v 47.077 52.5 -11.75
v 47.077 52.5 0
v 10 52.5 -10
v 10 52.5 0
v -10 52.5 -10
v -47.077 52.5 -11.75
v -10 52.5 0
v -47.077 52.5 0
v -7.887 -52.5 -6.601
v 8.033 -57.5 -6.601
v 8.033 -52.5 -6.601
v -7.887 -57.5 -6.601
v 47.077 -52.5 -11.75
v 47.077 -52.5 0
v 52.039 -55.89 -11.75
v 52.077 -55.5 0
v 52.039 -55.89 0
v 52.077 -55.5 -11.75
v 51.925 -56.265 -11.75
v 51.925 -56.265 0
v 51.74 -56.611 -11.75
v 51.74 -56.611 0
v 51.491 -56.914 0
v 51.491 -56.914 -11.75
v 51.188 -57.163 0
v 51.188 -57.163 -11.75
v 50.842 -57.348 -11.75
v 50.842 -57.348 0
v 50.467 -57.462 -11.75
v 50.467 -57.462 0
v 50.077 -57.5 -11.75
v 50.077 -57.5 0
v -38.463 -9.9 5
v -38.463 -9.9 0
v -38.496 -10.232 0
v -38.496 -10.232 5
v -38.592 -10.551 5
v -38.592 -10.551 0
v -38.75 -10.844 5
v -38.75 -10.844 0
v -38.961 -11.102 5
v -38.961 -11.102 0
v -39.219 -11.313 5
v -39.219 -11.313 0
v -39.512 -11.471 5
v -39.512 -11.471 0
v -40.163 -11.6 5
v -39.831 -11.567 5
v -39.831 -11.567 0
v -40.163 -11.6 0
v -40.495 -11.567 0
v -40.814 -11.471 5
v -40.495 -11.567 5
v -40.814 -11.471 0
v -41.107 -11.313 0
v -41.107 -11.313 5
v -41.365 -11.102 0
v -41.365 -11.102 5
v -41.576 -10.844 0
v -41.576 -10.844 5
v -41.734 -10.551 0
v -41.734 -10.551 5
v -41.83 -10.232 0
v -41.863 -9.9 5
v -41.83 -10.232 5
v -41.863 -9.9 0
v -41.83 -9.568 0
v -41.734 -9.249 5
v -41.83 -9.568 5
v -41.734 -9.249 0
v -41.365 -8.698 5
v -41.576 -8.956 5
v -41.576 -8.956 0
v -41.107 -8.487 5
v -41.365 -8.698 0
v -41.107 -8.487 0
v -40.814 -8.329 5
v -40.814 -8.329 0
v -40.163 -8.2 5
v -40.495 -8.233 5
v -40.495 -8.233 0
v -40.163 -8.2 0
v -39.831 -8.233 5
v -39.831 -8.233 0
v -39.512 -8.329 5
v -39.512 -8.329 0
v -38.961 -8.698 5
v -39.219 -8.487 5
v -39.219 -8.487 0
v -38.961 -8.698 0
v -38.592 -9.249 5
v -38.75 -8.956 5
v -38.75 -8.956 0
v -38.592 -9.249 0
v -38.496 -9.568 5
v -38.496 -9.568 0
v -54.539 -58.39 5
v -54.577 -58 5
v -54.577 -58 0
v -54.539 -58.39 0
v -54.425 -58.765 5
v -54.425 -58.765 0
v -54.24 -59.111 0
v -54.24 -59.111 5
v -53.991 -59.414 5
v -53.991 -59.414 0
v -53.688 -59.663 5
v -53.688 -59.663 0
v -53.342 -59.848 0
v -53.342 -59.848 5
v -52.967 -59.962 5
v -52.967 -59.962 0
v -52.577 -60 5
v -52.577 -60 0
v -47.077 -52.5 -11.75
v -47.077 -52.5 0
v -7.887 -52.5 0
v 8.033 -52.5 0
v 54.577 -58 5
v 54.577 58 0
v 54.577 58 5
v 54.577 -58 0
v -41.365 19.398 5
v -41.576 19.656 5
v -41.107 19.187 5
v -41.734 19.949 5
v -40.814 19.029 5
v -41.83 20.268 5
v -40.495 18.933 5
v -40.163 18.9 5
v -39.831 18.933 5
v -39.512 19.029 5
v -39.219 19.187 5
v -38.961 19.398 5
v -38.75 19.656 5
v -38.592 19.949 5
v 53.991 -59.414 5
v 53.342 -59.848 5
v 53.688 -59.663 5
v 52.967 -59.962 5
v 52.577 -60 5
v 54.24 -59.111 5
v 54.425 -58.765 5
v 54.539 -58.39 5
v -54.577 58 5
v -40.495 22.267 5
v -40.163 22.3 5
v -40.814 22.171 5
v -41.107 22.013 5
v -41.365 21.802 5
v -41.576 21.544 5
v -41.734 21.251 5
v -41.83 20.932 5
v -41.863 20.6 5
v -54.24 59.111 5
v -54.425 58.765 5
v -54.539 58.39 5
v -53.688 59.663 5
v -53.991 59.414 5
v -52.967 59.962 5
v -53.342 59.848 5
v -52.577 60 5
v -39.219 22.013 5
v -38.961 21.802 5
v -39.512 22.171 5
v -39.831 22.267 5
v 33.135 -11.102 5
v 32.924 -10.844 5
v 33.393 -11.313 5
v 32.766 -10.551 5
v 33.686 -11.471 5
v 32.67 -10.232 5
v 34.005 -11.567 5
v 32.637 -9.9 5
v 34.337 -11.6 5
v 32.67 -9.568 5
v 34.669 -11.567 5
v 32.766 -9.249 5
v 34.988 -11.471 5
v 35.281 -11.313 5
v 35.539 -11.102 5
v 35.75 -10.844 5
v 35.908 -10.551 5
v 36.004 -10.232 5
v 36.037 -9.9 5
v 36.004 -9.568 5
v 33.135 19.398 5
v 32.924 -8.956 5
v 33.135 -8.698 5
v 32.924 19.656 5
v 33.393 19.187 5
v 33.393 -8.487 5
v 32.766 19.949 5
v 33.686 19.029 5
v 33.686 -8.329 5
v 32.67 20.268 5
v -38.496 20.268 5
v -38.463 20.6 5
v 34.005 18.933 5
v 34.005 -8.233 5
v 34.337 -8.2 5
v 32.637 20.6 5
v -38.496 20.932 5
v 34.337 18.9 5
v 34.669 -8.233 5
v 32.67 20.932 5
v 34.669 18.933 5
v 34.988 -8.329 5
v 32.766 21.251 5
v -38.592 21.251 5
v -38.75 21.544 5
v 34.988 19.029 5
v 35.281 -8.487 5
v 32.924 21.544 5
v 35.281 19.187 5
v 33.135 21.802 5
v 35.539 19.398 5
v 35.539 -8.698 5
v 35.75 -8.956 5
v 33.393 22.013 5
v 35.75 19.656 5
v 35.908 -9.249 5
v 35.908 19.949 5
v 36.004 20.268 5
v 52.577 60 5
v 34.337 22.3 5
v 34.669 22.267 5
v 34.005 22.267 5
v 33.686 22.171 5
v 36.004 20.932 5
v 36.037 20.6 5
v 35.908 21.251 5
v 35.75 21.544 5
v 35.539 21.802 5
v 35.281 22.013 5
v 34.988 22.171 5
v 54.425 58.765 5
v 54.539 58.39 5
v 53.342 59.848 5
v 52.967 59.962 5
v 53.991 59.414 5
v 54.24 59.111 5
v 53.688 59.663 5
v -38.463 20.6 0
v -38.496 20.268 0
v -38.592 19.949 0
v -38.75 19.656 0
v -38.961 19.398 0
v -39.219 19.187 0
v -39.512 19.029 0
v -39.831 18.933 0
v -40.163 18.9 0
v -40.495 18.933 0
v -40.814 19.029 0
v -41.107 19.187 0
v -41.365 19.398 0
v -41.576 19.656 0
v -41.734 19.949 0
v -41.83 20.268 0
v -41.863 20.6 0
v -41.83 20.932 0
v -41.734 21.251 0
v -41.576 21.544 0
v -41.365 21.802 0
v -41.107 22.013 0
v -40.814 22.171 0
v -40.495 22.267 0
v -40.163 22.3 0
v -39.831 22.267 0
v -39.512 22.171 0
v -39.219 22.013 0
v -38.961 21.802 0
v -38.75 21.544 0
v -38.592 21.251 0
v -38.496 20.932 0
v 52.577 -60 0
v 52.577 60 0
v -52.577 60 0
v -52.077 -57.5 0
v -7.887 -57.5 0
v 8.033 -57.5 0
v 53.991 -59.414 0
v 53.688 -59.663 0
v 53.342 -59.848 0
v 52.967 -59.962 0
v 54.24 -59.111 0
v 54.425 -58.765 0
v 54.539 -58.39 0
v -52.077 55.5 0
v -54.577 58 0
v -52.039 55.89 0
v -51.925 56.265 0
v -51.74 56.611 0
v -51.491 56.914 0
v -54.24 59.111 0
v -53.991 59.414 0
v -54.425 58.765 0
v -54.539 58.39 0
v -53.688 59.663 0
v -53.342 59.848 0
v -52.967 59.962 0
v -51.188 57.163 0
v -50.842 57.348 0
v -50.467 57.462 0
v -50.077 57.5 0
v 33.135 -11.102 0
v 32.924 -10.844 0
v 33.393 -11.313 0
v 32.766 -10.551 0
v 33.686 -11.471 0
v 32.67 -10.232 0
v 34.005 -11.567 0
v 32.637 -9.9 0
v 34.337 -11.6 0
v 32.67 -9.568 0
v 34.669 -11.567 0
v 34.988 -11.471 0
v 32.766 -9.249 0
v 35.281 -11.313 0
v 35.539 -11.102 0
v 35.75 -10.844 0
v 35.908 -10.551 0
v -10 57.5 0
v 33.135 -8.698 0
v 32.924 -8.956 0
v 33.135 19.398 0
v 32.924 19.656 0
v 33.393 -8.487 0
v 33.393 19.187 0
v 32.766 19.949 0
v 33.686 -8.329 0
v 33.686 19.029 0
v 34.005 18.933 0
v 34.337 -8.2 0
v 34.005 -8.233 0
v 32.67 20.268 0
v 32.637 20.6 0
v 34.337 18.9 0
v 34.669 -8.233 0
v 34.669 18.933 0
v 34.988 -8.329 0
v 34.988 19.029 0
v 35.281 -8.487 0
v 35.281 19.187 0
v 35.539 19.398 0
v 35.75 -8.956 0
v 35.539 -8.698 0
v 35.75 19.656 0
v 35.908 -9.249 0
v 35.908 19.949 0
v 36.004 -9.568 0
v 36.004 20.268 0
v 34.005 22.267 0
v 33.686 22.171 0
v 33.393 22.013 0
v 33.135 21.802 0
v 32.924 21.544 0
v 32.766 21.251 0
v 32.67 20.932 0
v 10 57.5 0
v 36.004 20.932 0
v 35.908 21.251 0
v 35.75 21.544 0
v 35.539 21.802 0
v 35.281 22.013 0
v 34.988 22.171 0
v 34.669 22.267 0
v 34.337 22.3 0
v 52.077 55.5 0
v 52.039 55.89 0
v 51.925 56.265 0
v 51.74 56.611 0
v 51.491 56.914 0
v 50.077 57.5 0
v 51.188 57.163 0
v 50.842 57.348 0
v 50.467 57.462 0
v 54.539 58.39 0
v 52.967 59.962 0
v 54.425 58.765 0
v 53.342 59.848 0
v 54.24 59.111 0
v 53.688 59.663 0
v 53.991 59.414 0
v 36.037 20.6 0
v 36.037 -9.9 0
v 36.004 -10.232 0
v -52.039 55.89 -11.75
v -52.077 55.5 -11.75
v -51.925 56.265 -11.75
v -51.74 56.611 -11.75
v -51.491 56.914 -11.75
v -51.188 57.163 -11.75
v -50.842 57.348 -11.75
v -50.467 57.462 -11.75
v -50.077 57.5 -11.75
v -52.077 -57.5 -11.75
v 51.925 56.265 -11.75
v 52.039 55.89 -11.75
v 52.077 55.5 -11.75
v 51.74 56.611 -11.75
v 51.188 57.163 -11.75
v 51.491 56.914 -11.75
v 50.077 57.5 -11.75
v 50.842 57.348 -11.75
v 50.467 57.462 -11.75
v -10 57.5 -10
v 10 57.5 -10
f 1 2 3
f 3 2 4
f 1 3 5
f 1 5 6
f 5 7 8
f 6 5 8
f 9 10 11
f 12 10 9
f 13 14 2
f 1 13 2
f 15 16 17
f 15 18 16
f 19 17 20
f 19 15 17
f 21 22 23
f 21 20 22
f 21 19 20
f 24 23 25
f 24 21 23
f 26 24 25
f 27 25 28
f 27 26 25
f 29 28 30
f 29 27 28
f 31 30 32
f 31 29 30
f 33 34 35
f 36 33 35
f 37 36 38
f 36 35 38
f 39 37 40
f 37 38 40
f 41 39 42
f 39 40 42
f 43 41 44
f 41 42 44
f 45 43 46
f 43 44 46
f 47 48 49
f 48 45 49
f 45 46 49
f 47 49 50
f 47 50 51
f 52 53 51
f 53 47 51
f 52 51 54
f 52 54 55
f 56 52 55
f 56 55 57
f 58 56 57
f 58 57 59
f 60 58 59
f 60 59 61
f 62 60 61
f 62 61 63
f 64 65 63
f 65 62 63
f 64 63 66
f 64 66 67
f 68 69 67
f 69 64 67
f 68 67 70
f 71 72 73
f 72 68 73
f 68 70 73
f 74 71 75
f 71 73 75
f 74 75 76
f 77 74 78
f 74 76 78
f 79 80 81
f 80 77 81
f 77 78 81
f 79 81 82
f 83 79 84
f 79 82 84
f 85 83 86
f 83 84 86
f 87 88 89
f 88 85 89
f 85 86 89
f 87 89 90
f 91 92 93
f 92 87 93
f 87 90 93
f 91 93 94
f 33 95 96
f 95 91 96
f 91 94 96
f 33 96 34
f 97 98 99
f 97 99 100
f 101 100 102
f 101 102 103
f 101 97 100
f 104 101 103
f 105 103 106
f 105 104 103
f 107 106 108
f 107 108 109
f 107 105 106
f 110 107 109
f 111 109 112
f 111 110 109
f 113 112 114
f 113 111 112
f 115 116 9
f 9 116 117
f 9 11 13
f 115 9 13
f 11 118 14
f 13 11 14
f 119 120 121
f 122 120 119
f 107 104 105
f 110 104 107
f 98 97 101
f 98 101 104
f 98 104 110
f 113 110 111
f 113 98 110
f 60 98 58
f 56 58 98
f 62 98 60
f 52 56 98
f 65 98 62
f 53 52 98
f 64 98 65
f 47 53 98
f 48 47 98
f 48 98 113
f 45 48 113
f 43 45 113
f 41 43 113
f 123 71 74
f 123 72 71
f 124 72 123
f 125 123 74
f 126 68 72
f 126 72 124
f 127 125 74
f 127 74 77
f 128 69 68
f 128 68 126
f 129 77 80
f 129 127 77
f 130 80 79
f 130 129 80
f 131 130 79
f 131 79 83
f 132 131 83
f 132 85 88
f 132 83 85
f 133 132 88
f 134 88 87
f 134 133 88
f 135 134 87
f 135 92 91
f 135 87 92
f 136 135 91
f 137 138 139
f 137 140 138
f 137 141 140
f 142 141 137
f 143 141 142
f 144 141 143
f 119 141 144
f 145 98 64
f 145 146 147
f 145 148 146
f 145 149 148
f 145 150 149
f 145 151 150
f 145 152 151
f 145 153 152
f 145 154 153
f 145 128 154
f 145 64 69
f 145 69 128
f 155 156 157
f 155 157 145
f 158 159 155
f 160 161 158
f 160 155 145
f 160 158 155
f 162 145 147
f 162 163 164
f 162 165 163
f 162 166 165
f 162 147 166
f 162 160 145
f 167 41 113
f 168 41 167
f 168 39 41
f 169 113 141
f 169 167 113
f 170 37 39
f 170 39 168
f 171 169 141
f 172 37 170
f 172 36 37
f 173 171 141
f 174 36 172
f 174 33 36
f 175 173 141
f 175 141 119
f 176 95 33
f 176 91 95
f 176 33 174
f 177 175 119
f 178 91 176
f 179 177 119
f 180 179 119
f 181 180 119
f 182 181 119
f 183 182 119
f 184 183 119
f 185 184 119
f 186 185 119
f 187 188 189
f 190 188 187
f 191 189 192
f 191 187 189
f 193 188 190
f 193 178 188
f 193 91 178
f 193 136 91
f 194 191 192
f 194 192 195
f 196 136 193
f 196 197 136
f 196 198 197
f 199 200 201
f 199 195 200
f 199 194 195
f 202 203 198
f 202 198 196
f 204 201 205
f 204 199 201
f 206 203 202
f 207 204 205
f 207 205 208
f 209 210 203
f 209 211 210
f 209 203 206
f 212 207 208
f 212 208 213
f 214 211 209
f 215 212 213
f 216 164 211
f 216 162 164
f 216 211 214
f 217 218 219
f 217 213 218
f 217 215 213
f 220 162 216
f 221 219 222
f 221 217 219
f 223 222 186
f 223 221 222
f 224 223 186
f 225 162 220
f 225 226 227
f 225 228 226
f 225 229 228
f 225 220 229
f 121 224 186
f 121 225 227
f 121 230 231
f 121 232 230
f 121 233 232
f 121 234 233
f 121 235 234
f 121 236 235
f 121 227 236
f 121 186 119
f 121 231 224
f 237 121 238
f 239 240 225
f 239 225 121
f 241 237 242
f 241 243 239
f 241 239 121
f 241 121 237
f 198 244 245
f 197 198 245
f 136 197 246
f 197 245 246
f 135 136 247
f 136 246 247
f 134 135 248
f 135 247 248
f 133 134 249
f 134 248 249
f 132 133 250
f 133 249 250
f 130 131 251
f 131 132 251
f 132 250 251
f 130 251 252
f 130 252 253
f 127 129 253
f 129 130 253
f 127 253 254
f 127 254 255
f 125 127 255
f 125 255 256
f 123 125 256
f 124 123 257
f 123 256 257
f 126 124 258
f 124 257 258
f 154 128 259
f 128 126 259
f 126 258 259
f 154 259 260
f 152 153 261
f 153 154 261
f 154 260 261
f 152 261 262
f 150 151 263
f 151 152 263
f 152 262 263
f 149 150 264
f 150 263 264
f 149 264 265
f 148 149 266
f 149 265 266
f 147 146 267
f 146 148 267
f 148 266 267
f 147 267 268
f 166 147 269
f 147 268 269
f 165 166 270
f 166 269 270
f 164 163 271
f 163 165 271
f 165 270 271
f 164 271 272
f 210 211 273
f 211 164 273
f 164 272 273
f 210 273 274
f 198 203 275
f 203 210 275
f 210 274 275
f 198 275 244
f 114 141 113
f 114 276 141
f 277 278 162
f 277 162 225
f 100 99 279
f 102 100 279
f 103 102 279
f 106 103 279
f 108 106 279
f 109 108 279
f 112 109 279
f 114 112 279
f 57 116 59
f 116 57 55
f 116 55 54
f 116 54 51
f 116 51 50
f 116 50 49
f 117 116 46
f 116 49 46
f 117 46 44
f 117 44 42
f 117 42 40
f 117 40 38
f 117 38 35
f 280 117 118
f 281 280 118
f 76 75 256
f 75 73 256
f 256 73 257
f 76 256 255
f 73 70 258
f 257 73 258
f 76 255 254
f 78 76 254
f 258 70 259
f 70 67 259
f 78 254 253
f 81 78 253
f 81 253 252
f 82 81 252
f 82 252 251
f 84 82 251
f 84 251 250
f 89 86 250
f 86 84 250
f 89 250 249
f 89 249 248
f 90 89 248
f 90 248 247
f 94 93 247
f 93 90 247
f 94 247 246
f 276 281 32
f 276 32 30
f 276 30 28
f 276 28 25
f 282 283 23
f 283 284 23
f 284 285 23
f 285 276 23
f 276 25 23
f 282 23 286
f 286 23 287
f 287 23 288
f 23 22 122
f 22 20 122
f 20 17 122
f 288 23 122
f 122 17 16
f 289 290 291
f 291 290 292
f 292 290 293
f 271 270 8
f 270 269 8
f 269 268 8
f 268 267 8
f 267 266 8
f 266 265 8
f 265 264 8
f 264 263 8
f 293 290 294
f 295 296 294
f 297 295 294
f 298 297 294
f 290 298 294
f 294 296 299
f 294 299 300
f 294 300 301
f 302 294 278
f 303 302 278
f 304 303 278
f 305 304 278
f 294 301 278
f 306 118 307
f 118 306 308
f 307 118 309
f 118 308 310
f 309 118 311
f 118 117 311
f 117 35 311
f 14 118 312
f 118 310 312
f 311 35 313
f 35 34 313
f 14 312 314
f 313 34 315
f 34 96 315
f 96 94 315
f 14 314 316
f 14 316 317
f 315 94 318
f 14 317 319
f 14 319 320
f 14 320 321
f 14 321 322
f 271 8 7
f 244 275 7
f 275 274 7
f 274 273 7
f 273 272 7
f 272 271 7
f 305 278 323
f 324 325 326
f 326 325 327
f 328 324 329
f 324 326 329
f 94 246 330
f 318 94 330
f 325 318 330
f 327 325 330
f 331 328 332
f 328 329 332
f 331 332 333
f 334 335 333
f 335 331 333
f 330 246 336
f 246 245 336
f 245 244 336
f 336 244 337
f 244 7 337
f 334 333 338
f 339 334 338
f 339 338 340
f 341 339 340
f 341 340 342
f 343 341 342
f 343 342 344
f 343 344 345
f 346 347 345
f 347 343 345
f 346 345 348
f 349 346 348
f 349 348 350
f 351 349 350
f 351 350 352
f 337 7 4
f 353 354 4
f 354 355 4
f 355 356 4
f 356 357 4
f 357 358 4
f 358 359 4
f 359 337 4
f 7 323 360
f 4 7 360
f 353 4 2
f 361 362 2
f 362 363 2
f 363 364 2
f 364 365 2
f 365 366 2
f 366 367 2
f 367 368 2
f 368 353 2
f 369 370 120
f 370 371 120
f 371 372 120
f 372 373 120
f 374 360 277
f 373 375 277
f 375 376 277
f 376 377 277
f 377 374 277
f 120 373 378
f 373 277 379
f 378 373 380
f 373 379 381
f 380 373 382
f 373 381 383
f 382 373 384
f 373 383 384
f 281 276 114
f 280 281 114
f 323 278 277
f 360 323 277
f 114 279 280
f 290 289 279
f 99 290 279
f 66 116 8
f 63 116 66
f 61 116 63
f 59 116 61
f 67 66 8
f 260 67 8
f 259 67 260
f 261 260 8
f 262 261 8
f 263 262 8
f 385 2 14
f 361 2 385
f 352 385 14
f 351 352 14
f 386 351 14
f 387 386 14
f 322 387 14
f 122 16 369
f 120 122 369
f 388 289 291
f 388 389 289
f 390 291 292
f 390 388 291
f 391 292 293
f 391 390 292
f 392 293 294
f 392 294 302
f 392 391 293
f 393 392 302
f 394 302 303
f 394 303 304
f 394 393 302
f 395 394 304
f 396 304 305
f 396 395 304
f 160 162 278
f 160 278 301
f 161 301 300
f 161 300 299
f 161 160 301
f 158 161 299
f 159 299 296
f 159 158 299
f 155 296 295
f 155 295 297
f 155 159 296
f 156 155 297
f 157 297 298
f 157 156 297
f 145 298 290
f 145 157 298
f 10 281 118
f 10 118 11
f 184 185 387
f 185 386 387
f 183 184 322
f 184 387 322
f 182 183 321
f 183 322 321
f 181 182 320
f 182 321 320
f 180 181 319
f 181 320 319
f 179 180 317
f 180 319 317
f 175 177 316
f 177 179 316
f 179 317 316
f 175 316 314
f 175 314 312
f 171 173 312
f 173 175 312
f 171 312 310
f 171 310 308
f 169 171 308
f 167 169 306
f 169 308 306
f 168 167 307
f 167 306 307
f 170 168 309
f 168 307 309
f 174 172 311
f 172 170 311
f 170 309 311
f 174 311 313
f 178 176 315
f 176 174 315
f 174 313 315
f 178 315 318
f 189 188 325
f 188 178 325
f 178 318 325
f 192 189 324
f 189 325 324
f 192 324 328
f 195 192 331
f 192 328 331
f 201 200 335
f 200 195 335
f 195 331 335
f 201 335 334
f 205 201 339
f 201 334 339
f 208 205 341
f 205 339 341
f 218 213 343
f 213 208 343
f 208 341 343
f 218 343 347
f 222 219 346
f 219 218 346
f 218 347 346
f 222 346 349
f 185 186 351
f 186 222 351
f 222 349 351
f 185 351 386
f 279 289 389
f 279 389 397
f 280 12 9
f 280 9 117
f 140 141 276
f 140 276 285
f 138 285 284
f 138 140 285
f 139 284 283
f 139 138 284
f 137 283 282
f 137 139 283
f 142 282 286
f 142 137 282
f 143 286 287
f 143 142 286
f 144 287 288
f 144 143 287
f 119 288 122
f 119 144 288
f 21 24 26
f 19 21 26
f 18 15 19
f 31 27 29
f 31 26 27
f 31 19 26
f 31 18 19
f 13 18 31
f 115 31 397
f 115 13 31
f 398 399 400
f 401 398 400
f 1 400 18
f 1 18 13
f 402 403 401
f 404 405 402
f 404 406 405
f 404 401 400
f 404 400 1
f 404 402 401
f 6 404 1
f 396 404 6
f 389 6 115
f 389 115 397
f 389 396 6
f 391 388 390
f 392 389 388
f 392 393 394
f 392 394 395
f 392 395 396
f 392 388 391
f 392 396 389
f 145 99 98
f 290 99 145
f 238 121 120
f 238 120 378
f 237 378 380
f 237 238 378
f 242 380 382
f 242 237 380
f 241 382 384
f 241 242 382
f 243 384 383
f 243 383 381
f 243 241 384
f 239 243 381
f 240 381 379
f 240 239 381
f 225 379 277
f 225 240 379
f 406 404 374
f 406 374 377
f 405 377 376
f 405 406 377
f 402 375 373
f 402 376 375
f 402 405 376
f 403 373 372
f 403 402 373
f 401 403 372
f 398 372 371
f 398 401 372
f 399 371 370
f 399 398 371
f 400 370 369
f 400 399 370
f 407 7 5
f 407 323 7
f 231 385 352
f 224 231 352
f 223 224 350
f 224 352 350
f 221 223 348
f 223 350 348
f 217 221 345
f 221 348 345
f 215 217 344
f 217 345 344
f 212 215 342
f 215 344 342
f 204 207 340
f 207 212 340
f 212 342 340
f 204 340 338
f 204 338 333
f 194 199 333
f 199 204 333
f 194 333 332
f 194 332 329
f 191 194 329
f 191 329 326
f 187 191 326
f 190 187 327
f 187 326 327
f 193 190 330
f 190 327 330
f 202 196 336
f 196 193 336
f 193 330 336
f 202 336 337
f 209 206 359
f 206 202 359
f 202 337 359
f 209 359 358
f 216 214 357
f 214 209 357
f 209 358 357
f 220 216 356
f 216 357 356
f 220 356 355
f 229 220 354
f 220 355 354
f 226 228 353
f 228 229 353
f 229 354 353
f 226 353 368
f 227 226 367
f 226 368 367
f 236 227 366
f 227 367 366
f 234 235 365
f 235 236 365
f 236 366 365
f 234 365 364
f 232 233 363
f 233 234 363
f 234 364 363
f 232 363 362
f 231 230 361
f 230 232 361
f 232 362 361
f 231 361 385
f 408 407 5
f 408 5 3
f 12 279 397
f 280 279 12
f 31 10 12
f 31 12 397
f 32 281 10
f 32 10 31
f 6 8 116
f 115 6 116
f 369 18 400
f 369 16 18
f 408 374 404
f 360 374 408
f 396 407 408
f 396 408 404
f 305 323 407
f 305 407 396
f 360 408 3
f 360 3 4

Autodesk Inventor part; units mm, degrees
ref_plane "YZ Plane" through (0, 0, 0) normal (1, 0, 0) x (0, 1, 0)
ref_plane "XZ Plane" through (0, 0, 0) normal (0, 1, 0) x (-1, 0, 0)
ref_plane "XY Plane" through (0, 0, 0) normal (0, 0, 1) x (1, 0, 0)
sketch "Sketch1" plane through (0, 0, 0) normal (0, 0, 1) x (1, 0, 0)
  line L0 (-44.577, -50) -> (44.577, -50) projected
  line L1 (44.577, -50) -> (44.577, 50) projected
  line L2 (44.577, 50) -> (-44.577, 50) projected
  line L3 (-44.577, 50) -> (-44.577, -50) projected
  line L4 (54.577, 60) -> (54.577, -60)
  line L5 (54.577, -60) -> (-54.577, -60)
  line L6 (-54.577, -60) -> (-54.577, 60)
  line L7 (-54.577, 60) -> (54.577, 60)
  circle A0 centre (34.337, -9.9) radius 1.7 projected
  circle A1 centre (34.337, 20.6) radius 1.7 projected
  circle A2 centre (-40.163, -9.9) radius 1.7 projected
  circle A3 centre (-40.163, 20.6) radius 1.7 projected
  point P0 (0, 0)
  dimension "d0" = 10
extrude "Extrusion1" add sketch "Sketch1" along normal blind 5 contours L3 L2 L1 L0 | L4 L5 L6 L7
sketch "Sketch2" plane through (0, 0, 0) normal (0, 0, -1) x (-1, 0, 0)
  line L0 (44.577, -50) -> (-44.577, -50) projected
  line L1 (44.577, 50) -> (44.577, -50) projected
  line L2 (-44.577, 50) -> (44.577, 50) projected
  line L3 (-44.577, -50) -> (-44.577, 50) projected
  line L4 (54.577, 60) -> (54.577, -60) projected
  line L5 (-54.577, 60) -> (54.577, 60) projected
  line L6 (-54.577, -60) -> (-54.577, 60) projected
  line L7 (54.577, -60) -> (-54.577, -60) projected
  circle A0 centre (-34.337, -9.9) radius 1.7 projected
  circle A1 centre (-34.337, 20.6) radius 1.7 projected
  circle A2 centre (40.163, -9.9) radius 1.7 projected
  circle A3 centre (40.163, 20.6) radius 1.7 projected
  line L8 (47.077, 52.5) -> (47.077, -52.5)
  line L9 (47.077, -52.5) -> (-47.077, -52.5)
  line L10 (-47.077, -52.5) -> (-47.077, 52.5)
  line L11 (-47.077, 52.5) -> (47.077, 52.5)
  line L12 (52.077, 57.5) -> (52.077, -57.5)
  line L13 (52.077, -57.5) -> (-52.077, -57.5)
  line L14 (-52.077, -57.5) -> (-52.077, 57.5)
  line L15 (-52.077, 57.5) -> (52.077, 57.5)
  point P0 (0, 0)
  dimension "d3" = 2.5
  dimension "d4" = 2.5
extrude "Extrusion2" add sketch "Sketch2" along normal blind 11.75 contours L12 L13 L14 L15
fillet "Fillet1" radius 2 7 edges at (52.077, -57.5, -5.875) (54.577, -60, 2.5) (-54.577, -60, 2.5) (-54.577, 60, 2.5) (-52.077, 57.5, -5.875) (52.077, 57.5, -5.875) (54.577, 60, 2.5)
sketch "Sketch3" plane through (-52.077, -57.5, -11.75) normal (0, -1, 0) x (1, 0, 0)
  line L0 (44.1897, 5.1489) -> (44.1897, 11.75) projected
  line L1 (60.1104, 5.1489) -> (44.1897, 5.1489) projected
  line L2 (60.1104, 11.75) -> (60.1104, 5.1489) projected
  line L3 (0, 11.75) -> (102.154, 11.75) projected
  point P0 (52.077, 11.75)
extrude "Extrusion3" cut sketch "Sketch3" against normal blind 11.75
sketch "Sketch4" plane through (-50.077, 57.5, 0) normal (0, 1, 0) x (1, 0, 0)
  line L0 (40.077, 10) -> (60.077, 10) projected
  line L1 (40.077, 0) -> (40.077, 10) projected
  line L2 (60.077, 10) -> (60.077, 0) projected
  line L3 (100.154, 0) -> (0, 0) projected
  point P0 (50.077, 0)
extrude "Extrusion4" cut sketch "Sketch4" against normal blind 11.75
properties part number "Cubierta parte 1"
